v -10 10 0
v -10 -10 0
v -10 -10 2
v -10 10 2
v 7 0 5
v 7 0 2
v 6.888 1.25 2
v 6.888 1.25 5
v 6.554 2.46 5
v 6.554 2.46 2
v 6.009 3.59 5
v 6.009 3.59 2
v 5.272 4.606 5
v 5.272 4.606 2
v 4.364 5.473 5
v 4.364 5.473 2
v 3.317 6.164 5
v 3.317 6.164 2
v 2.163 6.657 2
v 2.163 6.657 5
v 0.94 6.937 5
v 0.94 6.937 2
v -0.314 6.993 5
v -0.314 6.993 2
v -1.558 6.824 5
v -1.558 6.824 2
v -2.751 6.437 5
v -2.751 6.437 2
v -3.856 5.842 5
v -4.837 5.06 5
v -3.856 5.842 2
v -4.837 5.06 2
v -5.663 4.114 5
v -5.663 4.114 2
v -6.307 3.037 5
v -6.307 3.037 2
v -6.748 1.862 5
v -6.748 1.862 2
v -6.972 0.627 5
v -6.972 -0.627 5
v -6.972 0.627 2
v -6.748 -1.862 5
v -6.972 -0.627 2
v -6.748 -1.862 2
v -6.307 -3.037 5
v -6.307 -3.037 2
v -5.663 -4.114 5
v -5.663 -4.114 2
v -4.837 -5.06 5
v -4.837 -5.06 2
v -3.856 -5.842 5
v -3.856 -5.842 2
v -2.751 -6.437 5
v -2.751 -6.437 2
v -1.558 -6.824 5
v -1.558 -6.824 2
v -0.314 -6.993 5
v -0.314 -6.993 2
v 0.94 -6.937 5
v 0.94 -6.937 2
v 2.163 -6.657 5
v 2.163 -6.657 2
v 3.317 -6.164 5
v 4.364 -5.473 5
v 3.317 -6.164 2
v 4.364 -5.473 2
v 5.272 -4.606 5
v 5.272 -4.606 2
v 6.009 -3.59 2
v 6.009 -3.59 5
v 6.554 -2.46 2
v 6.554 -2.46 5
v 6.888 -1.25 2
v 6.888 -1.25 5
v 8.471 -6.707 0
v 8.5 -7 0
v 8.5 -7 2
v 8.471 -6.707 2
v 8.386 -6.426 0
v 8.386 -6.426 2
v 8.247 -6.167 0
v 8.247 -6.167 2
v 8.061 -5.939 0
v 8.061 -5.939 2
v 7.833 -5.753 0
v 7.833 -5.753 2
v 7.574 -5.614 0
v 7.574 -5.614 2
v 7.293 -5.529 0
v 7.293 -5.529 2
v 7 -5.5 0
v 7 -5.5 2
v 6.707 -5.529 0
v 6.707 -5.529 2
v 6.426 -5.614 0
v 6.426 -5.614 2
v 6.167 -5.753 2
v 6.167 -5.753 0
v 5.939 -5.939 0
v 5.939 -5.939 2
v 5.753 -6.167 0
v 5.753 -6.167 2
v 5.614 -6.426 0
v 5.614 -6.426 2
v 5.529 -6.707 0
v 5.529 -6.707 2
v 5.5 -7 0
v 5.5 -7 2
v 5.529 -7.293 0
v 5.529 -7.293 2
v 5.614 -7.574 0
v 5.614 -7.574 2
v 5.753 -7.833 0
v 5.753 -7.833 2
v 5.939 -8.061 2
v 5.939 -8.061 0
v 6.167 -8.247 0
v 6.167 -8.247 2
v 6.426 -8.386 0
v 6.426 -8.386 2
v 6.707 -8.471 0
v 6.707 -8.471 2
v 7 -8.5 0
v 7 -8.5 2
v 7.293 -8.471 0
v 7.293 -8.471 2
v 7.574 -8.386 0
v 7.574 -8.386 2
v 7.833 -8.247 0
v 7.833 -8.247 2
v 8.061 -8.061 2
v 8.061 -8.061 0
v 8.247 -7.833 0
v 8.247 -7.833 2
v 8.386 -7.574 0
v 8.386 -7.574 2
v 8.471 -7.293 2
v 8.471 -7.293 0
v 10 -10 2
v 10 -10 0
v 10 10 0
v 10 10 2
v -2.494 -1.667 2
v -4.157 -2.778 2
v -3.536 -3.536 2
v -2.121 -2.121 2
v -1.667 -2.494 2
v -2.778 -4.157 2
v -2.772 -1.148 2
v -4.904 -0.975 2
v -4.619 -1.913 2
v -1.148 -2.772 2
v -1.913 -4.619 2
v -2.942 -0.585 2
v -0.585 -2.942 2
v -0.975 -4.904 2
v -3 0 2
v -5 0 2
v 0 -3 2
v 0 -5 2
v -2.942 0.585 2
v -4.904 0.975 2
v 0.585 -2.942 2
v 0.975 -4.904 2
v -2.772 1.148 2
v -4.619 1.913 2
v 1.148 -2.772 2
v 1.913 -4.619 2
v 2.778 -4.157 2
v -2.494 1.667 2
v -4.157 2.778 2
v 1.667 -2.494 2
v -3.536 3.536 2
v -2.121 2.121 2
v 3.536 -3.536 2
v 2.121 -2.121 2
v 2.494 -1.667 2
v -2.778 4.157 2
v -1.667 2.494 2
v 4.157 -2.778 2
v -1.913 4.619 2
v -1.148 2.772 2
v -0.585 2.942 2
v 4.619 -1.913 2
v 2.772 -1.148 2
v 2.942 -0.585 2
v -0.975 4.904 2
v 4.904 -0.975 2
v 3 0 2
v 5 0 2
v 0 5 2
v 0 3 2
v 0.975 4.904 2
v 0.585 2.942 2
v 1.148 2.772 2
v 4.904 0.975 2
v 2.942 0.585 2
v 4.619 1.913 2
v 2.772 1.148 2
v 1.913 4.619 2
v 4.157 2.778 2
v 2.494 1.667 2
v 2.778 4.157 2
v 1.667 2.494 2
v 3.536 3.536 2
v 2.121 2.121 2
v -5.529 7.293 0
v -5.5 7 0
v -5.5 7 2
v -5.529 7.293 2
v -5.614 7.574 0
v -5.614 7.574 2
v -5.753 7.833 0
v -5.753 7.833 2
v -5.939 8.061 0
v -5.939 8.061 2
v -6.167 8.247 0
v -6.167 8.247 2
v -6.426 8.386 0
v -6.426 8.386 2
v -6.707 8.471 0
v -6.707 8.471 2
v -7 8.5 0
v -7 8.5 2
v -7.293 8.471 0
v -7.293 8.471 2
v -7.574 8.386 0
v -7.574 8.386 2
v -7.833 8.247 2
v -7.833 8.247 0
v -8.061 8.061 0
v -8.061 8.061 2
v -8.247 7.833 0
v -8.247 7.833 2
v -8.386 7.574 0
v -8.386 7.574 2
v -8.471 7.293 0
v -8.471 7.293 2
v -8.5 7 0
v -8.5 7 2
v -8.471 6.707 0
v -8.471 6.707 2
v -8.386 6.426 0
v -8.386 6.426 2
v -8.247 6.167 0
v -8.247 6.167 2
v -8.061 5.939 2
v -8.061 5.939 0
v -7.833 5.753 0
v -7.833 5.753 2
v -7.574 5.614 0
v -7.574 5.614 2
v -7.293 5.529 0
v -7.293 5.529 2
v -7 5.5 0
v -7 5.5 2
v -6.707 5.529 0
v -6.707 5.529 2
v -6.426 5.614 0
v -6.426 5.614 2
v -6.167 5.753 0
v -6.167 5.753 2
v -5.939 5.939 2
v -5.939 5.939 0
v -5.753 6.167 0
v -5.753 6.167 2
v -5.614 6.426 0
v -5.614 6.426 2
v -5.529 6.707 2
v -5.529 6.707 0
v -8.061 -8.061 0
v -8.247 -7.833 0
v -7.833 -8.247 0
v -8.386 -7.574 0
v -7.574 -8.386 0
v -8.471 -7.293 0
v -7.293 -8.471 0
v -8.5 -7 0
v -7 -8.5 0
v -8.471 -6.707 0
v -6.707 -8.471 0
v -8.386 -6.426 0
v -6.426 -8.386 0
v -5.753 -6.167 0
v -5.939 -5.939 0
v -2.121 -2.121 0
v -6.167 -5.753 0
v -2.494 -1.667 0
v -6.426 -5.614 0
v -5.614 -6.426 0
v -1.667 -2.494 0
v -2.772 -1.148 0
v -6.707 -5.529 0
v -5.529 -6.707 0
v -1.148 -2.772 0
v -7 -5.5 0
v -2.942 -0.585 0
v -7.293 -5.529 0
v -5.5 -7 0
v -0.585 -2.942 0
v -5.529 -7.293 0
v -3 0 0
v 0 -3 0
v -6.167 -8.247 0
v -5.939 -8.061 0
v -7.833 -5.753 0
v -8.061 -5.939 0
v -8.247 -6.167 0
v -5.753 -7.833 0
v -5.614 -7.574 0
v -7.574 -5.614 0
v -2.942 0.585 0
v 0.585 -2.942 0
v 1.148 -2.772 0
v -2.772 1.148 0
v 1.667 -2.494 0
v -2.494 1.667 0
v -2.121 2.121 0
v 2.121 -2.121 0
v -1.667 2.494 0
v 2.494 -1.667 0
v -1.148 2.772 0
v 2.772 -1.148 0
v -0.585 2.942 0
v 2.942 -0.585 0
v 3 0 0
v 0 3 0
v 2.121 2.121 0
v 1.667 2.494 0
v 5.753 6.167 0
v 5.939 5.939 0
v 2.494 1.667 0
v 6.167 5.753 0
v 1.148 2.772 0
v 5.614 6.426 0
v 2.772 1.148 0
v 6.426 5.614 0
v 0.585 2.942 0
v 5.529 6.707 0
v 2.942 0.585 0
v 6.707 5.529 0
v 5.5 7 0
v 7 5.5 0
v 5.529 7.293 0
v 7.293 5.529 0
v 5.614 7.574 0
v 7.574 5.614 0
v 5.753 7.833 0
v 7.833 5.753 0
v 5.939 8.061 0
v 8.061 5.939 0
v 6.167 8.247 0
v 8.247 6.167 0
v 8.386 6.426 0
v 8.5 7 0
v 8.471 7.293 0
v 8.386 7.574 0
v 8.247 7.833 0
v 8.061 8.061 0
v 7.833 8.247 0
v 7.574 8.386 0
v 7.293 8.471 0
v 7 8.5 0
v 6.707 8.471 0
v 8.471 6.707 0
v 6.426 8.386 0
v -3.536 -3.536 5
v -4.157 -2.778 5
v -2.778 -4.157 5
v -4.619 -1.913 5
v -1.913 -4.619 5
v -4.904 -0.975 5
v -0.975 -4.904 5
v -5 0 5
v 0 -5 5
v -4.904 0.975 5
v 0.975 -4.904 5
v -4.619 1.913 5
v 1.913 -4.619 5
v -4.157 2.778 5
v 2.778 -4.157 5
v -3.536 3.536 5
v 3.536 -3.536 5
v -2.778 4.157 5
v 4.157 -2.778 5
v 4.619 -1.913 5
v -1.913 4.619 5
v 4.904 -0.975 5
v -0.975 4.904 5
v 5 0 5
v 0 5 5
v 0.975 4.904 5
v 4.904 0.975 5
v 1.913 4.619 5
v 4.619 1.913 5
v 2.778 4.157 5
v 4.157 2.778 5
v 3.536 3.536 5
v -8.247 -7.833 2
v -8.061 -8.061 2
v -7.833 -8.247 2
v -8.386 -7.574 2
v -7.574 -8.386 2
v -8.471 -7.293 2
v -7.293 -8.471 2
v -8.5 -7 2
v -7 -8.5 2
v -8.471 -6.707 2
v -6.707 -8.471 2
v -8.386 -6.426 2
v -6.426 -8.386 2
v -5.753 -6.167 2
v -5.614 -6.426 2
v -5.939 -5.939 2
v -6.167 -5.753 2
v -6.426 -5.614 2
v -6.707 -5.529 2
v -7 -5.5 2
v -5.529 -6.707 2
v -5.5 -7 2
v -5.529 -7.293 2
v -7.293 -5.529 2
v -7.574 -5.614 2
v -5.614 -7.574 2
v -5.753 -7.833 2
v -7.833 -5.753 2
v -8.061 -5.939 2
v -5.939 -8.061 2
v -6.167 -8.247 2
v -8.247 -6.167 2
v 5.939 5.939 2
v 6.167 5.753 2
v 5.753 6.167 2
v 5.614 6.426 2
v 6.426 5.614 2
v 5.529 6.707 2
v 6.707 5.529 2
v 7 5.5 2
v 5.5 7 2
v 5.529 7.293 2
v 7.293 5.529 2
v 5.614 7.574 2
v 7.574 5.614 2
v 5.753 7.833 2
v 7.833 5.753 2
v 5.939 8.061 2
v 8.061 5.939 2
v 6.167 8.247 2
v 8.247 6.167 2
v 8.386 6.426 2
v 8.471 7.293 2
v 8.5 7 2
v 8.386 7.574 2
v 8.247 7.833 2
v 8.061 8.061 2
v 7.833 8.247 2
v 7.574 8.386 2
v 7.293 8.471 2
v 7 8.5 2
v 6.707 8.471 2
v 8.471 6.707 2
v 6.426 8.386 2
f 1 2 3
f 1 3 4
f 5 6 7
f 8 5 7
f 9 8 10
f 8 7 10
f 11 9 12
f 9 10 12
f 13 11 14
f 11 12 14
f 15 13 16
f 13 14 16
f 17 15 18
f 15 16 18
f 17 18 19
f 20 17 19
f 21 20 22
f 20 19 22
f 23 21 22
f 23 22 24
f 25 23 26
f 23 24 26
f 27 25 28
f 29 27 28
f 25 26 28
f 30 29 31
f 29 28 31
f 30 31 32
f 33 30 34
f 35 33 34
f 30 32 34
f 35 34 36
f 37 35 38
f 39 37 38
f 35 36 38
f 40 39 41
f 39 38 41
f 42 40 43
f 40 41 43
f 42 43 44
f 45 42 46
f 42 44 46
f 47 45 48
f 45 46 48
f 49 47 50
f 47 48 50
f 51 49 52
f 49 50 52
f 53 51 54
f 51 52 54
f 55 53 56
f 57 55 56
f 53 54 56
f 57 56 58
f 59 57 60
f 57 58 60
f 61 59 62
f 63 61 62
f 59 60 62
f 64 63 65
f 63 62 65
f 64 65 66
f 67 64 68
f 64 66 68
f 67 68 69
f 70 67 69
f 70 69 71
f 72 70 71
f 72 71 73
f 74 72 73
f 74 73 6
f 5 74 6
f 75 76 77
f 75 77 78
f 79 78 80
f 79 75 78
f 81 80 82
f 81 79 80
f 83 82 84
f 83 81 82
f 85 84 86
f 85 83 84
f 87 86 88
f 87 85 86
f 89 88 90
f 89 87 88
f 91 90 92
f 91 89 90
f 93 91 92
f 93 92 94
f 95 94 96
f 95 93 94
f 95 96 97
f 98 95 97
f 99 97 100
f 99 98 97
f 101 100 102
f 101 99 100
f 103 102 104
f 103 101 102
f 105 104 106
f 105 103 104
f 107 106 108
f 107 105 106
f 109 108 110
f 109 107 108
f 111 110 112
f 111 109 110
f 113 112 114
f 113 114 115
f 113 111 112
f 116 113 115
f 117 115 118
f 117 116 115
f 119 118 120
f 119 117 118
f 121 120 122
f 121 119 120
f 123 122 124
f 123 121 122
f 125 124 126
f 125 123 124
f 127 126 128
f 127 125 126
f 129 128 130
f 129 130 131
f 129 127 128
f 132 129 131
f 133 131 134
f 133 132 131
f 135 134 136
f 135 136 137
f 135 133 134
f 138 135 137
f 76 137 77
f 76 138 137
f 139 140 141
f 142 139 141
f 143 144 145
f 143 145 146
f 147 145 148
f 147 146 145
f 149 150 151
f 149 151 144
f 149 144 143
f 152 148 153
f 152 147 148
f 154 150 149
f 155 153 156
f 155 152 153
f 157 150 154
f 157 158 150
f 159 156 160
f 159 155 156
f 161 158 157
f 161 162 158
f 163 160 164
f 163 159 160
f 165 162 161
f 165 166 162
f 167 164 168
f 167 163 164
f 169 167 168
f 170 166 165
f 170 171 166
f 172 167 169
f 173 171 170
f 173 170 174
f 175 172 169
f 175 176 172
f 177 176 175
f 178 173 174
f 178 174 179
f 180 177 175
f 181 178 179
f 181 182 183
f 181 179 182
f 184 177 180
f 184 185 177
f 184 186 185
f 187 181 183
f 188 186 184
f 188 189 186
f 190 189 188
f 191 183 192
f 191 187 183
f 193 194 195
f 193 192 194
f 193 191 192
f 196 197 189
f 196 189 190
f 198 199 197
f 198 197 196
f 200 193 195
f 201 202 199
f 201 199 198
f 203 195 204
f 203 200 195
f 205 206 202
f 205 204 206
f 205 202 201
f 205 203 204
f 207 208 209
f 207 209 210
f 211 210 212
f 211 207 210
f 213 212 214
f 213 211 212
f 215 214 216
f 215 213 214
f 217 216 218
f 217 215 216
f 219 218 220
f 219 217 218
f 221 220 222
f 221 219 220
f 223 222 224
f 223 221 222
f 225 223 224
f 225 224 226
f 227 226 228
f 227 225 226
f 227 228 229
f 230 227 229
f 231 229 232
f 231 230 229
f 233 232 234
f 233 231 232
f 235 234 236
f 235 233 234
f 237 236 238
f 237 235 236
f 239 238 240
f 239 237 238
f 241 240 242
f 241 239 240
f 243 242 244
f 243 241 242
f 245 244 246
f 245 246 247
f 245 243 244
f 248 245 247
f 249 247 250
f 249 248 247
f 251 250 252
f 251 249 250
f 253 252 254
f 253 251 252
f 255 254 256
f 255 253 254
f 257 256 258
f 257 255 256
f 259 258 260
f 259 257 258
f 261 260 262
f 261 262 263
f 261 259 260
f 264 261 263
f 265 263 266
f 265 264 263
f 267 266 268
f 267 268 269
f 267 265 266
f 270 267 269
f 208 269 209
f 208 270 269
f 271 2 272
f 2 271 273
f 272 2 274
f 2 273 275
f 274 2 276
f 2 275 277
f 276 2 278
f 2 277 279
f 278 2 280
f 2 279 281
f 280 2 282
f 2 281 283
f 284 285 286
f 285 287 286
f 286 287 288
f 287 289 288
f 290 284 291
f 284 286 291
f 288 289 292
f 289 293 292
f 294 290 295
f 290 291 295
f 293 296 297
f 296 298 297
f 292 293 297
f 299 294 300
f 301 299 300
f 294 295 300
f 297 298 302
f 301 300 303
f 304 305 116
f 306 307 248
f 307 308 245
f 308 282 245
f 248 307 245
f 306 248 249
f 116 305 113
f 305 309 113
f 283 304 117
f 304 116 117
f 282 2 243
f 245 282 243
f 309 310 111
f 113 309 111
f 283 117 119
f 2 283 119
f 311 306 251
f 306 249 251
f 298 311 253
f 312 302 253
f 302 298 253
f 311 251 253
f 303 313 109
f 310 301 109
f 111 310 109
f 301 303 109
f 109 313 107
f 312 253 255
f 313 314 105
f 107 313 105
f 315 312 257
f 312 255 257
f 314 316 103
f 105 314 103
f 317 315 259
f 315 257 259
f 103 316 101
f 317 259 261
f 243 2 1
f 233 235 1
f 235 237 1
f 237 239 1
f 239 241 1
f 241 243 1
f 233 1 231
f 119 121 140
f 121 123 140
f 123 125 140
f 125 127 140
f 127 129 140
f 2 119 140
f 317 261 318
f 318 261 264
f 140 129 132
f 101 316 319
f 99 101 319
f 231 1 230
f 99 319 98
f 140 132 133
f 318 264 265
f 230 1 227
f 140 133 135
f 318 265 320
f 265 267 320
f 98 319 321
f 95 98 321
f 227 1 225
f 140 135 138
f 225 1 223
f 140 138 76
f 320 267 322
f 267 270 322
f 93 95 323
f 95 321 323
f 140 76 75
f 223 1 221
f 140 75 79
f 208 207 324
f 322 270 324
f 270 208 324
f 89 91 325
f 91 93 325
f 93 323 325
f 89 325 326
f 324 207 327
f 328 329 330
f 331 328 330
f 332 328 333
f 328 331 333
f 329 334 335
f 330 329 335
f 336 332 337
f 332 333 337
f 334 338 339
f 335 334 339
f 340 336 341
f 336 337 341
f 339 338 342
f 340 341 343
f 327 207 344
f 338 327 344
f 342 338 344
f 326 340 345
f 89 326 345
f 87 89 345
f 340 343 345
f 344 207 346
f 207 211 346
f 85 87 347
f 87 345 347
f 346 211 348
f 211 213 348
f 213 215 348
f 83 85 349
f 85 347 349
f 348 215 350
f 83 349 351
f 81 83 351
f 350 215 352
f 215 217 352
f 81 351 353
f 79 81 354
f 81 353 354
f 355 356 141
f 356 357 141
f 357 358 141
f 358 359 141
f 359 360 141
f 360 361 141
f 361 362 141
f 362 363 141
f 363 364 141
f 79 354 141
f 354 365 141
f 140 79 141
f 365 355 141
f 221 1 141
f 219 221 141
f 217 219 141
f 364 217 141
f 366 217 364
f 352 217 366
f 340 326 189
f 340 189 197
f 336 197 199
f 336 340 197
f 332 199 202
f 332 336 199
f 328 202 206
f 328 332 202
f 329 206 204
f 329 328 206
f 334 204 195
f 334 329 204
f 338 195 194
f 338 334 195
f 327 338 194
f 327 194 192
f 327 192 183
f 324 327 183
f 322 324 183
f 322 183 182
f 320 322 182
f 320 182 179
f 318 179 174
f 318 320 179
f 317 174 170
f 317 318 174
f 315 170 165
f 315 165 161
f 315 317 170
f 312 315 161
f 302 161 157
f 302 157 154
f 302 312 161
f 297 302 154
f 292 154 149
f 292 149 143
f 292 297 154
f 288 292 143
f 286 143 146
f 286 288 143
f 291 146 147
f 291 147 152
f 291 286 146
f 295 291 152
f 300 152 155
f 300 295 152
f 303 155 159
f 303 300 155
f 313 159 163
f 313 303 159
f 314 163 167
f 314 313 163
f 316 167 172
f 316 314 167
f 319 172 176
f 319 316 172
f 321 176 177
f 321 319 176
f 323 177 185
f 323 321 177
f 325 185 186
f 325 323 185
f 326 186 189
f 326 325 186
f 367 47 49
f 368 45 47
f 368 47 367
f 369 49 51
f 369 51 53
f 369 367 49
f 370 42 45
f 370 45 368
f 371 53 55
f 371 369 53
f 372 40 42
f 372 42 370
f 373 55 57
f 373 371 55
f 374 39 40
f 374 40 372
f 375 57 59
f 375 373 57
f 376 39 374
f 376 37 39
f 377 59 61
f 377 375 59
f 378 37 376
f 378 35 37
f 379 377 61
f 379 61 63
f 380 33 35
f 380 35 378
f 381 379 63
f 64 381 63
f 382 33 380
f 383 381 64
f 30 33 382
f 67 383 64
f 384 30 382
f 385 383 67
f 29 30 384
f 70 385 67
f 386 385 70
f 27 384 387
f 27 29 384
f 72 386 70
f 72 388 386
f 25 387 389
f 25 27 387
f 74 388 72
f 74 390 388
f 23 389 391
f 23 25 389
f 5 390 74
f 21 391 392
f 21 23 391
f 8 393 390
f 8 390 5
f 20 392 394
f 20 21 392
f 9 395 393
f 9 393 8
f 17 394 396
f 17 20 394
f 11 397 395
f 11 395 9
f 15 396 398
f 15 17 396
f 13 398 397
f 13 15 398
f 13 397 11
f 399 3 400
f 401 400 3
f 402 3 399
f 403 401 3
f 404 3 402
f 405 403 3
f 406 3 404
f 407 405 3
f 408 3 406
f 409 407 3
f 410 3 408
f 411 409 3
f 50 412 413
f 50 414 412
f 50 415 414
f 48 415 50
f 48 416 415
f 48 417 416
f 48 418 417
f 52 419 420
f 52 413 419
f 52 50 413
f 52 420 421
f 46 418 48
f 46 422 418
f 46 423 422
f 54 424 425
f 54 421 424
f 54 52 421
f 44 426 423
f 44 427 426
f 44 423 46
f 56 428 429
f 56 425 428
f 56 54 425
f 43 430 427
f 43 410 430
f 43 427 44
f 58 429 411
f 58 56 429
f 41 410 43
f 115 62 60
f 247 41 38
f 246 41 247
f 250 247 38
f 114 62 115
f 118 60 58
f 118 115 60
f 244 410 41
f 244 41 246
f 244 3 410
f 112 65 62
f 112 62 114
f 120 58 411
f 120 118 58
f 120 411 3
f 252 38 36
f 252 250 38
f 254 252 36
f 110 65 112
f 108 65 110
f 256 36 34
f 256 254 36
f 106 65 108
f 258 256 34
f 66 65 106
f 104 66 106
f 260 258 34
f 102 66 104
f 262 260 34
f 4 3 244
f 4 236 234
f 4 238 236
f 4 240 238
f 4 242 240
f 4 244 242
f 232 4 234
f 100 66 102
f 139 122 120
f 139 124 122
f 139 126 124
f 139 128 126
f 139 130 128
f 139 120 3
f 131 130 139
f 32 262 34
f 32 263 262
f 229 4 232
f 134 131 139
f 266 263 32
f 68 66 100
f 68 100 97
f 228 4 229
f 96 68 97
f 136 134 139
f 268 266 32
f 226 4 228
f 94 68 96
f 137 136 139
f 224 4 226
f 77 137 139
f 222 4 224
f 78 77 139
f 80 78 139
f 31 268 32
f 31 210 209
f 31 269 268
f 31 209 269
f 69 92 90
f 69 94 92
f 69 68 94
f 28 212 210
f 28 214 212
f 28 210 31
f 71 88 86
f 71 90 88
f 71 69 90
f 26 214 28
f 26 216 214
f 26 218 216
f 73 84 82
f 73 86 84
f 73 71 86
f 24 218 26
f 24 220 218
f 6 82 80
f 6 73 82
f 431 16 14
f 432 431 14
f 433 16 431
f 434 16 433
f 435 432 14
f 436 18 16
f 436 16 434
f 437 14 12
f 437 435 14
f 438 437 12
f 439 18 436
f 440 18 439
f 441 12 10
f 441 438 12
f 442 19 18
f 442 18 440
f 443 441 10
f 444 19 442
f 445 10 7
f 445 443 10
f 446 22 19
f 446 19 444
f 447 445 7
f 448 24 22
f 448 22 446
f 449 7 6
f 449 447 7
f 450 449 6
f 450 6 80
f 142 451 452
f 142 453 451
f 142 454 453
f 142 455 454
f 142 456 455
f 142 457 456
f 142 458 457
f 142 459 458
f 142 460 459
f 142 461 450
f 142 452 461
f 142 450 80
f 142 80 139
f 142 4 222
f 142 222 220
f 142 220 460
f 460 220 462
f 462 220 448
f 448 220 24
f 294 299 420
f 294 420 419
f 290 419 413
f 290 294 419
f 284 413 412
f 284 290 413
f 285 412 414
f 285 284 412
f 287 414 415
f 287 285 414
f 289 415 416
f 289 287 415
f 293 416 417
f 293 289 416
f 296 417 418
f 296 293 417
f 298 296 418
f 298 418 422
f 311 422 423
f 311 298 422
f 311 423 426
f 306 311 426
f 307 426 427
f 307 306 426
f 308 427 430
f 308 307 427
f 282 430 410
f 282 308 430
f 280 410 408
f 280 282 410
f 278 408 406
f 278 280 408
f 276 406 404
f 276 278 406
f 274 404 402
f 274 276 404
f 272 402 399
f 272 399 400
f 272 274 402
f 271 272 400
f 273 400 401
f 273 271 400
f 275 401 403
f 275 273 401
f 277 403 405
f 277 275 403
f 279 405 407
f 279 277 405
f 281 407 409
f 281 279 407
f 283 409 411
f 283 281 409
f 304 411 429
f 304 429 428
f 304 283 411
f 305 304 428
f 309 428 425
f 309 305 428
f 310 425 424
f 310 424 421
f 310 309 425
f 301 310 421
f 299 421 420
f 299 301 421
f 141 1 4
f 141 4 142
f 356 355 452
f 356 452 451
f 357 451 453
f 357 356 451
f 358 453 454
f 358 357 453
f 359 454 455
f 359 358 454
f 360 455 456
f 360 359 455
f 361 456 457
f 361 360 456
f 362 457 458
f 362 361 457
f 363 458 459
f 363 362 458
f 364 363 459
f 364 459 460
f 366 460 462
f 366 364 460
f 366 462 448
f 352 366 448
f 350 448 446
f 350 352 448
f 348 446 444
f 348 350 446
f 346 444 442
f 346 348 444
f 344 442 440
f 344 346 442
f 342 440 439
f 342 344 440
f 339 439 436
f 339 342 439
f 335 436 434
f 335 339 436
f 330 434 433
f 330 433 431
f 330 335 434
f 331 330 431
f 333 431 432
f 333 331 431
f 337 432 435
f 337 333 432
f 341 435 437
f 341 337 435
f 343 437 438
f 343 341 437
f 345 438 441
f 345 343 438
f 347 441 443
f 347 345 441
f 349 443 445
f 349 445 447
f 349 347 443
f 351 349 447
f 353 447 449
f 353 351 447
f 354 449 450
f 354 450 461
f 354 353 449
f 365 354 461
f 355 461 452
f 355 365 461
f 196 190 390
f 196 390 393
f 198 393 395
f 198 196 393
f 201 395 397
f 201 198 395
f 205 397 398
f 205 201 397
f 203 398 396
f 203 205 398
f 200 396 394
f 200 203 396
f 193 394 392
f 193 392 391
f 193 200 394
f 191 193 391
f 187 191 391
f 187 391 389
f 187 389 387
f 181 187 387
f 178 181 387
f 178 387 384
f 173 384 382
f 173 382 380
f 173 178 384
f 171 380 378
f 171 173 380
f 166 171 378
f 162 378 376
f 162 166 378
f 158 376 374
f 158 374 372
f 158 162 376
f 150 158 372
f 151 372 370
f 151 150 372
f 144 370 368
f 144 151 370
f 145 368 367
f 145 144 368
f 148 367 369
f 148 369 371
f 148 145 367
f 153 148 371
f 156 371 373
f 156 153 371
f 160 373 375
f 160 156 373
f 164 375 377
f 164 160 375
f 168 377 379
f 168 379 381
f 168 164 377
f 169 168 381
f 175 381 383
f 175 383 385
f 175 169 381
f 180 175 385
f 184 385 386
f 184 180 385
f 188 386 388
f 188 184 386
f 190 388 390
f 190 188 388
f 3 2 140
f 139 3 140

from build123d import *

# Parameters (mm, degrees)
SKETCH_1_W      = 20
SKETCH_1_H      = 20
SKETCH_1_R      = 1.5
SKETCH_1_R_2    = 3
EXTRUDE_1_DEPTH = 2
SKETCH_2_R      = 7
SKETCH_2_R_2    = 5
EXTRUDE_2_DEPTH = 3


with BuildPart() as part:
    # 草图1 → 凸台-拉伸1 (new body)
    with BuildSketch(Plane.XY):
        Rectangle(SKETCH_1_W, SKETCH_1_H)
        with Locations((-7, 7)):
            Circle(SKETCH_1_R, mode=Mode.SUBTRACT)
        with Locations((7, 7)):
            Circle(SKETCH_1_R, mode=Mode.SUBTRACT)
        with Locations((7, -7)):
            Circle(SKETCH_1_R, mode=Mode.SUBTRACT)
        with Locations((-7, -7)):
            Circle(SKETCH_1_R, mode=Mode.SUBTRACT)
        Circle(SKETCH_1_R_2, mode=Mode.SUBTRACT)
    extrude(amount=EXTRUDE_1_DEPTH)

    # 草图2 → 凸台-拉伸2 (add)
    with BuildSketch(Plane.XY.offset(2)):
        Circle(SKETCH_2_R)
        Circle(SKETCH_2_R_2, mode=Mode.SUBTRACT)
    extrude(amount=EXTRUDE_2_DEPTH)


solid = part.part
